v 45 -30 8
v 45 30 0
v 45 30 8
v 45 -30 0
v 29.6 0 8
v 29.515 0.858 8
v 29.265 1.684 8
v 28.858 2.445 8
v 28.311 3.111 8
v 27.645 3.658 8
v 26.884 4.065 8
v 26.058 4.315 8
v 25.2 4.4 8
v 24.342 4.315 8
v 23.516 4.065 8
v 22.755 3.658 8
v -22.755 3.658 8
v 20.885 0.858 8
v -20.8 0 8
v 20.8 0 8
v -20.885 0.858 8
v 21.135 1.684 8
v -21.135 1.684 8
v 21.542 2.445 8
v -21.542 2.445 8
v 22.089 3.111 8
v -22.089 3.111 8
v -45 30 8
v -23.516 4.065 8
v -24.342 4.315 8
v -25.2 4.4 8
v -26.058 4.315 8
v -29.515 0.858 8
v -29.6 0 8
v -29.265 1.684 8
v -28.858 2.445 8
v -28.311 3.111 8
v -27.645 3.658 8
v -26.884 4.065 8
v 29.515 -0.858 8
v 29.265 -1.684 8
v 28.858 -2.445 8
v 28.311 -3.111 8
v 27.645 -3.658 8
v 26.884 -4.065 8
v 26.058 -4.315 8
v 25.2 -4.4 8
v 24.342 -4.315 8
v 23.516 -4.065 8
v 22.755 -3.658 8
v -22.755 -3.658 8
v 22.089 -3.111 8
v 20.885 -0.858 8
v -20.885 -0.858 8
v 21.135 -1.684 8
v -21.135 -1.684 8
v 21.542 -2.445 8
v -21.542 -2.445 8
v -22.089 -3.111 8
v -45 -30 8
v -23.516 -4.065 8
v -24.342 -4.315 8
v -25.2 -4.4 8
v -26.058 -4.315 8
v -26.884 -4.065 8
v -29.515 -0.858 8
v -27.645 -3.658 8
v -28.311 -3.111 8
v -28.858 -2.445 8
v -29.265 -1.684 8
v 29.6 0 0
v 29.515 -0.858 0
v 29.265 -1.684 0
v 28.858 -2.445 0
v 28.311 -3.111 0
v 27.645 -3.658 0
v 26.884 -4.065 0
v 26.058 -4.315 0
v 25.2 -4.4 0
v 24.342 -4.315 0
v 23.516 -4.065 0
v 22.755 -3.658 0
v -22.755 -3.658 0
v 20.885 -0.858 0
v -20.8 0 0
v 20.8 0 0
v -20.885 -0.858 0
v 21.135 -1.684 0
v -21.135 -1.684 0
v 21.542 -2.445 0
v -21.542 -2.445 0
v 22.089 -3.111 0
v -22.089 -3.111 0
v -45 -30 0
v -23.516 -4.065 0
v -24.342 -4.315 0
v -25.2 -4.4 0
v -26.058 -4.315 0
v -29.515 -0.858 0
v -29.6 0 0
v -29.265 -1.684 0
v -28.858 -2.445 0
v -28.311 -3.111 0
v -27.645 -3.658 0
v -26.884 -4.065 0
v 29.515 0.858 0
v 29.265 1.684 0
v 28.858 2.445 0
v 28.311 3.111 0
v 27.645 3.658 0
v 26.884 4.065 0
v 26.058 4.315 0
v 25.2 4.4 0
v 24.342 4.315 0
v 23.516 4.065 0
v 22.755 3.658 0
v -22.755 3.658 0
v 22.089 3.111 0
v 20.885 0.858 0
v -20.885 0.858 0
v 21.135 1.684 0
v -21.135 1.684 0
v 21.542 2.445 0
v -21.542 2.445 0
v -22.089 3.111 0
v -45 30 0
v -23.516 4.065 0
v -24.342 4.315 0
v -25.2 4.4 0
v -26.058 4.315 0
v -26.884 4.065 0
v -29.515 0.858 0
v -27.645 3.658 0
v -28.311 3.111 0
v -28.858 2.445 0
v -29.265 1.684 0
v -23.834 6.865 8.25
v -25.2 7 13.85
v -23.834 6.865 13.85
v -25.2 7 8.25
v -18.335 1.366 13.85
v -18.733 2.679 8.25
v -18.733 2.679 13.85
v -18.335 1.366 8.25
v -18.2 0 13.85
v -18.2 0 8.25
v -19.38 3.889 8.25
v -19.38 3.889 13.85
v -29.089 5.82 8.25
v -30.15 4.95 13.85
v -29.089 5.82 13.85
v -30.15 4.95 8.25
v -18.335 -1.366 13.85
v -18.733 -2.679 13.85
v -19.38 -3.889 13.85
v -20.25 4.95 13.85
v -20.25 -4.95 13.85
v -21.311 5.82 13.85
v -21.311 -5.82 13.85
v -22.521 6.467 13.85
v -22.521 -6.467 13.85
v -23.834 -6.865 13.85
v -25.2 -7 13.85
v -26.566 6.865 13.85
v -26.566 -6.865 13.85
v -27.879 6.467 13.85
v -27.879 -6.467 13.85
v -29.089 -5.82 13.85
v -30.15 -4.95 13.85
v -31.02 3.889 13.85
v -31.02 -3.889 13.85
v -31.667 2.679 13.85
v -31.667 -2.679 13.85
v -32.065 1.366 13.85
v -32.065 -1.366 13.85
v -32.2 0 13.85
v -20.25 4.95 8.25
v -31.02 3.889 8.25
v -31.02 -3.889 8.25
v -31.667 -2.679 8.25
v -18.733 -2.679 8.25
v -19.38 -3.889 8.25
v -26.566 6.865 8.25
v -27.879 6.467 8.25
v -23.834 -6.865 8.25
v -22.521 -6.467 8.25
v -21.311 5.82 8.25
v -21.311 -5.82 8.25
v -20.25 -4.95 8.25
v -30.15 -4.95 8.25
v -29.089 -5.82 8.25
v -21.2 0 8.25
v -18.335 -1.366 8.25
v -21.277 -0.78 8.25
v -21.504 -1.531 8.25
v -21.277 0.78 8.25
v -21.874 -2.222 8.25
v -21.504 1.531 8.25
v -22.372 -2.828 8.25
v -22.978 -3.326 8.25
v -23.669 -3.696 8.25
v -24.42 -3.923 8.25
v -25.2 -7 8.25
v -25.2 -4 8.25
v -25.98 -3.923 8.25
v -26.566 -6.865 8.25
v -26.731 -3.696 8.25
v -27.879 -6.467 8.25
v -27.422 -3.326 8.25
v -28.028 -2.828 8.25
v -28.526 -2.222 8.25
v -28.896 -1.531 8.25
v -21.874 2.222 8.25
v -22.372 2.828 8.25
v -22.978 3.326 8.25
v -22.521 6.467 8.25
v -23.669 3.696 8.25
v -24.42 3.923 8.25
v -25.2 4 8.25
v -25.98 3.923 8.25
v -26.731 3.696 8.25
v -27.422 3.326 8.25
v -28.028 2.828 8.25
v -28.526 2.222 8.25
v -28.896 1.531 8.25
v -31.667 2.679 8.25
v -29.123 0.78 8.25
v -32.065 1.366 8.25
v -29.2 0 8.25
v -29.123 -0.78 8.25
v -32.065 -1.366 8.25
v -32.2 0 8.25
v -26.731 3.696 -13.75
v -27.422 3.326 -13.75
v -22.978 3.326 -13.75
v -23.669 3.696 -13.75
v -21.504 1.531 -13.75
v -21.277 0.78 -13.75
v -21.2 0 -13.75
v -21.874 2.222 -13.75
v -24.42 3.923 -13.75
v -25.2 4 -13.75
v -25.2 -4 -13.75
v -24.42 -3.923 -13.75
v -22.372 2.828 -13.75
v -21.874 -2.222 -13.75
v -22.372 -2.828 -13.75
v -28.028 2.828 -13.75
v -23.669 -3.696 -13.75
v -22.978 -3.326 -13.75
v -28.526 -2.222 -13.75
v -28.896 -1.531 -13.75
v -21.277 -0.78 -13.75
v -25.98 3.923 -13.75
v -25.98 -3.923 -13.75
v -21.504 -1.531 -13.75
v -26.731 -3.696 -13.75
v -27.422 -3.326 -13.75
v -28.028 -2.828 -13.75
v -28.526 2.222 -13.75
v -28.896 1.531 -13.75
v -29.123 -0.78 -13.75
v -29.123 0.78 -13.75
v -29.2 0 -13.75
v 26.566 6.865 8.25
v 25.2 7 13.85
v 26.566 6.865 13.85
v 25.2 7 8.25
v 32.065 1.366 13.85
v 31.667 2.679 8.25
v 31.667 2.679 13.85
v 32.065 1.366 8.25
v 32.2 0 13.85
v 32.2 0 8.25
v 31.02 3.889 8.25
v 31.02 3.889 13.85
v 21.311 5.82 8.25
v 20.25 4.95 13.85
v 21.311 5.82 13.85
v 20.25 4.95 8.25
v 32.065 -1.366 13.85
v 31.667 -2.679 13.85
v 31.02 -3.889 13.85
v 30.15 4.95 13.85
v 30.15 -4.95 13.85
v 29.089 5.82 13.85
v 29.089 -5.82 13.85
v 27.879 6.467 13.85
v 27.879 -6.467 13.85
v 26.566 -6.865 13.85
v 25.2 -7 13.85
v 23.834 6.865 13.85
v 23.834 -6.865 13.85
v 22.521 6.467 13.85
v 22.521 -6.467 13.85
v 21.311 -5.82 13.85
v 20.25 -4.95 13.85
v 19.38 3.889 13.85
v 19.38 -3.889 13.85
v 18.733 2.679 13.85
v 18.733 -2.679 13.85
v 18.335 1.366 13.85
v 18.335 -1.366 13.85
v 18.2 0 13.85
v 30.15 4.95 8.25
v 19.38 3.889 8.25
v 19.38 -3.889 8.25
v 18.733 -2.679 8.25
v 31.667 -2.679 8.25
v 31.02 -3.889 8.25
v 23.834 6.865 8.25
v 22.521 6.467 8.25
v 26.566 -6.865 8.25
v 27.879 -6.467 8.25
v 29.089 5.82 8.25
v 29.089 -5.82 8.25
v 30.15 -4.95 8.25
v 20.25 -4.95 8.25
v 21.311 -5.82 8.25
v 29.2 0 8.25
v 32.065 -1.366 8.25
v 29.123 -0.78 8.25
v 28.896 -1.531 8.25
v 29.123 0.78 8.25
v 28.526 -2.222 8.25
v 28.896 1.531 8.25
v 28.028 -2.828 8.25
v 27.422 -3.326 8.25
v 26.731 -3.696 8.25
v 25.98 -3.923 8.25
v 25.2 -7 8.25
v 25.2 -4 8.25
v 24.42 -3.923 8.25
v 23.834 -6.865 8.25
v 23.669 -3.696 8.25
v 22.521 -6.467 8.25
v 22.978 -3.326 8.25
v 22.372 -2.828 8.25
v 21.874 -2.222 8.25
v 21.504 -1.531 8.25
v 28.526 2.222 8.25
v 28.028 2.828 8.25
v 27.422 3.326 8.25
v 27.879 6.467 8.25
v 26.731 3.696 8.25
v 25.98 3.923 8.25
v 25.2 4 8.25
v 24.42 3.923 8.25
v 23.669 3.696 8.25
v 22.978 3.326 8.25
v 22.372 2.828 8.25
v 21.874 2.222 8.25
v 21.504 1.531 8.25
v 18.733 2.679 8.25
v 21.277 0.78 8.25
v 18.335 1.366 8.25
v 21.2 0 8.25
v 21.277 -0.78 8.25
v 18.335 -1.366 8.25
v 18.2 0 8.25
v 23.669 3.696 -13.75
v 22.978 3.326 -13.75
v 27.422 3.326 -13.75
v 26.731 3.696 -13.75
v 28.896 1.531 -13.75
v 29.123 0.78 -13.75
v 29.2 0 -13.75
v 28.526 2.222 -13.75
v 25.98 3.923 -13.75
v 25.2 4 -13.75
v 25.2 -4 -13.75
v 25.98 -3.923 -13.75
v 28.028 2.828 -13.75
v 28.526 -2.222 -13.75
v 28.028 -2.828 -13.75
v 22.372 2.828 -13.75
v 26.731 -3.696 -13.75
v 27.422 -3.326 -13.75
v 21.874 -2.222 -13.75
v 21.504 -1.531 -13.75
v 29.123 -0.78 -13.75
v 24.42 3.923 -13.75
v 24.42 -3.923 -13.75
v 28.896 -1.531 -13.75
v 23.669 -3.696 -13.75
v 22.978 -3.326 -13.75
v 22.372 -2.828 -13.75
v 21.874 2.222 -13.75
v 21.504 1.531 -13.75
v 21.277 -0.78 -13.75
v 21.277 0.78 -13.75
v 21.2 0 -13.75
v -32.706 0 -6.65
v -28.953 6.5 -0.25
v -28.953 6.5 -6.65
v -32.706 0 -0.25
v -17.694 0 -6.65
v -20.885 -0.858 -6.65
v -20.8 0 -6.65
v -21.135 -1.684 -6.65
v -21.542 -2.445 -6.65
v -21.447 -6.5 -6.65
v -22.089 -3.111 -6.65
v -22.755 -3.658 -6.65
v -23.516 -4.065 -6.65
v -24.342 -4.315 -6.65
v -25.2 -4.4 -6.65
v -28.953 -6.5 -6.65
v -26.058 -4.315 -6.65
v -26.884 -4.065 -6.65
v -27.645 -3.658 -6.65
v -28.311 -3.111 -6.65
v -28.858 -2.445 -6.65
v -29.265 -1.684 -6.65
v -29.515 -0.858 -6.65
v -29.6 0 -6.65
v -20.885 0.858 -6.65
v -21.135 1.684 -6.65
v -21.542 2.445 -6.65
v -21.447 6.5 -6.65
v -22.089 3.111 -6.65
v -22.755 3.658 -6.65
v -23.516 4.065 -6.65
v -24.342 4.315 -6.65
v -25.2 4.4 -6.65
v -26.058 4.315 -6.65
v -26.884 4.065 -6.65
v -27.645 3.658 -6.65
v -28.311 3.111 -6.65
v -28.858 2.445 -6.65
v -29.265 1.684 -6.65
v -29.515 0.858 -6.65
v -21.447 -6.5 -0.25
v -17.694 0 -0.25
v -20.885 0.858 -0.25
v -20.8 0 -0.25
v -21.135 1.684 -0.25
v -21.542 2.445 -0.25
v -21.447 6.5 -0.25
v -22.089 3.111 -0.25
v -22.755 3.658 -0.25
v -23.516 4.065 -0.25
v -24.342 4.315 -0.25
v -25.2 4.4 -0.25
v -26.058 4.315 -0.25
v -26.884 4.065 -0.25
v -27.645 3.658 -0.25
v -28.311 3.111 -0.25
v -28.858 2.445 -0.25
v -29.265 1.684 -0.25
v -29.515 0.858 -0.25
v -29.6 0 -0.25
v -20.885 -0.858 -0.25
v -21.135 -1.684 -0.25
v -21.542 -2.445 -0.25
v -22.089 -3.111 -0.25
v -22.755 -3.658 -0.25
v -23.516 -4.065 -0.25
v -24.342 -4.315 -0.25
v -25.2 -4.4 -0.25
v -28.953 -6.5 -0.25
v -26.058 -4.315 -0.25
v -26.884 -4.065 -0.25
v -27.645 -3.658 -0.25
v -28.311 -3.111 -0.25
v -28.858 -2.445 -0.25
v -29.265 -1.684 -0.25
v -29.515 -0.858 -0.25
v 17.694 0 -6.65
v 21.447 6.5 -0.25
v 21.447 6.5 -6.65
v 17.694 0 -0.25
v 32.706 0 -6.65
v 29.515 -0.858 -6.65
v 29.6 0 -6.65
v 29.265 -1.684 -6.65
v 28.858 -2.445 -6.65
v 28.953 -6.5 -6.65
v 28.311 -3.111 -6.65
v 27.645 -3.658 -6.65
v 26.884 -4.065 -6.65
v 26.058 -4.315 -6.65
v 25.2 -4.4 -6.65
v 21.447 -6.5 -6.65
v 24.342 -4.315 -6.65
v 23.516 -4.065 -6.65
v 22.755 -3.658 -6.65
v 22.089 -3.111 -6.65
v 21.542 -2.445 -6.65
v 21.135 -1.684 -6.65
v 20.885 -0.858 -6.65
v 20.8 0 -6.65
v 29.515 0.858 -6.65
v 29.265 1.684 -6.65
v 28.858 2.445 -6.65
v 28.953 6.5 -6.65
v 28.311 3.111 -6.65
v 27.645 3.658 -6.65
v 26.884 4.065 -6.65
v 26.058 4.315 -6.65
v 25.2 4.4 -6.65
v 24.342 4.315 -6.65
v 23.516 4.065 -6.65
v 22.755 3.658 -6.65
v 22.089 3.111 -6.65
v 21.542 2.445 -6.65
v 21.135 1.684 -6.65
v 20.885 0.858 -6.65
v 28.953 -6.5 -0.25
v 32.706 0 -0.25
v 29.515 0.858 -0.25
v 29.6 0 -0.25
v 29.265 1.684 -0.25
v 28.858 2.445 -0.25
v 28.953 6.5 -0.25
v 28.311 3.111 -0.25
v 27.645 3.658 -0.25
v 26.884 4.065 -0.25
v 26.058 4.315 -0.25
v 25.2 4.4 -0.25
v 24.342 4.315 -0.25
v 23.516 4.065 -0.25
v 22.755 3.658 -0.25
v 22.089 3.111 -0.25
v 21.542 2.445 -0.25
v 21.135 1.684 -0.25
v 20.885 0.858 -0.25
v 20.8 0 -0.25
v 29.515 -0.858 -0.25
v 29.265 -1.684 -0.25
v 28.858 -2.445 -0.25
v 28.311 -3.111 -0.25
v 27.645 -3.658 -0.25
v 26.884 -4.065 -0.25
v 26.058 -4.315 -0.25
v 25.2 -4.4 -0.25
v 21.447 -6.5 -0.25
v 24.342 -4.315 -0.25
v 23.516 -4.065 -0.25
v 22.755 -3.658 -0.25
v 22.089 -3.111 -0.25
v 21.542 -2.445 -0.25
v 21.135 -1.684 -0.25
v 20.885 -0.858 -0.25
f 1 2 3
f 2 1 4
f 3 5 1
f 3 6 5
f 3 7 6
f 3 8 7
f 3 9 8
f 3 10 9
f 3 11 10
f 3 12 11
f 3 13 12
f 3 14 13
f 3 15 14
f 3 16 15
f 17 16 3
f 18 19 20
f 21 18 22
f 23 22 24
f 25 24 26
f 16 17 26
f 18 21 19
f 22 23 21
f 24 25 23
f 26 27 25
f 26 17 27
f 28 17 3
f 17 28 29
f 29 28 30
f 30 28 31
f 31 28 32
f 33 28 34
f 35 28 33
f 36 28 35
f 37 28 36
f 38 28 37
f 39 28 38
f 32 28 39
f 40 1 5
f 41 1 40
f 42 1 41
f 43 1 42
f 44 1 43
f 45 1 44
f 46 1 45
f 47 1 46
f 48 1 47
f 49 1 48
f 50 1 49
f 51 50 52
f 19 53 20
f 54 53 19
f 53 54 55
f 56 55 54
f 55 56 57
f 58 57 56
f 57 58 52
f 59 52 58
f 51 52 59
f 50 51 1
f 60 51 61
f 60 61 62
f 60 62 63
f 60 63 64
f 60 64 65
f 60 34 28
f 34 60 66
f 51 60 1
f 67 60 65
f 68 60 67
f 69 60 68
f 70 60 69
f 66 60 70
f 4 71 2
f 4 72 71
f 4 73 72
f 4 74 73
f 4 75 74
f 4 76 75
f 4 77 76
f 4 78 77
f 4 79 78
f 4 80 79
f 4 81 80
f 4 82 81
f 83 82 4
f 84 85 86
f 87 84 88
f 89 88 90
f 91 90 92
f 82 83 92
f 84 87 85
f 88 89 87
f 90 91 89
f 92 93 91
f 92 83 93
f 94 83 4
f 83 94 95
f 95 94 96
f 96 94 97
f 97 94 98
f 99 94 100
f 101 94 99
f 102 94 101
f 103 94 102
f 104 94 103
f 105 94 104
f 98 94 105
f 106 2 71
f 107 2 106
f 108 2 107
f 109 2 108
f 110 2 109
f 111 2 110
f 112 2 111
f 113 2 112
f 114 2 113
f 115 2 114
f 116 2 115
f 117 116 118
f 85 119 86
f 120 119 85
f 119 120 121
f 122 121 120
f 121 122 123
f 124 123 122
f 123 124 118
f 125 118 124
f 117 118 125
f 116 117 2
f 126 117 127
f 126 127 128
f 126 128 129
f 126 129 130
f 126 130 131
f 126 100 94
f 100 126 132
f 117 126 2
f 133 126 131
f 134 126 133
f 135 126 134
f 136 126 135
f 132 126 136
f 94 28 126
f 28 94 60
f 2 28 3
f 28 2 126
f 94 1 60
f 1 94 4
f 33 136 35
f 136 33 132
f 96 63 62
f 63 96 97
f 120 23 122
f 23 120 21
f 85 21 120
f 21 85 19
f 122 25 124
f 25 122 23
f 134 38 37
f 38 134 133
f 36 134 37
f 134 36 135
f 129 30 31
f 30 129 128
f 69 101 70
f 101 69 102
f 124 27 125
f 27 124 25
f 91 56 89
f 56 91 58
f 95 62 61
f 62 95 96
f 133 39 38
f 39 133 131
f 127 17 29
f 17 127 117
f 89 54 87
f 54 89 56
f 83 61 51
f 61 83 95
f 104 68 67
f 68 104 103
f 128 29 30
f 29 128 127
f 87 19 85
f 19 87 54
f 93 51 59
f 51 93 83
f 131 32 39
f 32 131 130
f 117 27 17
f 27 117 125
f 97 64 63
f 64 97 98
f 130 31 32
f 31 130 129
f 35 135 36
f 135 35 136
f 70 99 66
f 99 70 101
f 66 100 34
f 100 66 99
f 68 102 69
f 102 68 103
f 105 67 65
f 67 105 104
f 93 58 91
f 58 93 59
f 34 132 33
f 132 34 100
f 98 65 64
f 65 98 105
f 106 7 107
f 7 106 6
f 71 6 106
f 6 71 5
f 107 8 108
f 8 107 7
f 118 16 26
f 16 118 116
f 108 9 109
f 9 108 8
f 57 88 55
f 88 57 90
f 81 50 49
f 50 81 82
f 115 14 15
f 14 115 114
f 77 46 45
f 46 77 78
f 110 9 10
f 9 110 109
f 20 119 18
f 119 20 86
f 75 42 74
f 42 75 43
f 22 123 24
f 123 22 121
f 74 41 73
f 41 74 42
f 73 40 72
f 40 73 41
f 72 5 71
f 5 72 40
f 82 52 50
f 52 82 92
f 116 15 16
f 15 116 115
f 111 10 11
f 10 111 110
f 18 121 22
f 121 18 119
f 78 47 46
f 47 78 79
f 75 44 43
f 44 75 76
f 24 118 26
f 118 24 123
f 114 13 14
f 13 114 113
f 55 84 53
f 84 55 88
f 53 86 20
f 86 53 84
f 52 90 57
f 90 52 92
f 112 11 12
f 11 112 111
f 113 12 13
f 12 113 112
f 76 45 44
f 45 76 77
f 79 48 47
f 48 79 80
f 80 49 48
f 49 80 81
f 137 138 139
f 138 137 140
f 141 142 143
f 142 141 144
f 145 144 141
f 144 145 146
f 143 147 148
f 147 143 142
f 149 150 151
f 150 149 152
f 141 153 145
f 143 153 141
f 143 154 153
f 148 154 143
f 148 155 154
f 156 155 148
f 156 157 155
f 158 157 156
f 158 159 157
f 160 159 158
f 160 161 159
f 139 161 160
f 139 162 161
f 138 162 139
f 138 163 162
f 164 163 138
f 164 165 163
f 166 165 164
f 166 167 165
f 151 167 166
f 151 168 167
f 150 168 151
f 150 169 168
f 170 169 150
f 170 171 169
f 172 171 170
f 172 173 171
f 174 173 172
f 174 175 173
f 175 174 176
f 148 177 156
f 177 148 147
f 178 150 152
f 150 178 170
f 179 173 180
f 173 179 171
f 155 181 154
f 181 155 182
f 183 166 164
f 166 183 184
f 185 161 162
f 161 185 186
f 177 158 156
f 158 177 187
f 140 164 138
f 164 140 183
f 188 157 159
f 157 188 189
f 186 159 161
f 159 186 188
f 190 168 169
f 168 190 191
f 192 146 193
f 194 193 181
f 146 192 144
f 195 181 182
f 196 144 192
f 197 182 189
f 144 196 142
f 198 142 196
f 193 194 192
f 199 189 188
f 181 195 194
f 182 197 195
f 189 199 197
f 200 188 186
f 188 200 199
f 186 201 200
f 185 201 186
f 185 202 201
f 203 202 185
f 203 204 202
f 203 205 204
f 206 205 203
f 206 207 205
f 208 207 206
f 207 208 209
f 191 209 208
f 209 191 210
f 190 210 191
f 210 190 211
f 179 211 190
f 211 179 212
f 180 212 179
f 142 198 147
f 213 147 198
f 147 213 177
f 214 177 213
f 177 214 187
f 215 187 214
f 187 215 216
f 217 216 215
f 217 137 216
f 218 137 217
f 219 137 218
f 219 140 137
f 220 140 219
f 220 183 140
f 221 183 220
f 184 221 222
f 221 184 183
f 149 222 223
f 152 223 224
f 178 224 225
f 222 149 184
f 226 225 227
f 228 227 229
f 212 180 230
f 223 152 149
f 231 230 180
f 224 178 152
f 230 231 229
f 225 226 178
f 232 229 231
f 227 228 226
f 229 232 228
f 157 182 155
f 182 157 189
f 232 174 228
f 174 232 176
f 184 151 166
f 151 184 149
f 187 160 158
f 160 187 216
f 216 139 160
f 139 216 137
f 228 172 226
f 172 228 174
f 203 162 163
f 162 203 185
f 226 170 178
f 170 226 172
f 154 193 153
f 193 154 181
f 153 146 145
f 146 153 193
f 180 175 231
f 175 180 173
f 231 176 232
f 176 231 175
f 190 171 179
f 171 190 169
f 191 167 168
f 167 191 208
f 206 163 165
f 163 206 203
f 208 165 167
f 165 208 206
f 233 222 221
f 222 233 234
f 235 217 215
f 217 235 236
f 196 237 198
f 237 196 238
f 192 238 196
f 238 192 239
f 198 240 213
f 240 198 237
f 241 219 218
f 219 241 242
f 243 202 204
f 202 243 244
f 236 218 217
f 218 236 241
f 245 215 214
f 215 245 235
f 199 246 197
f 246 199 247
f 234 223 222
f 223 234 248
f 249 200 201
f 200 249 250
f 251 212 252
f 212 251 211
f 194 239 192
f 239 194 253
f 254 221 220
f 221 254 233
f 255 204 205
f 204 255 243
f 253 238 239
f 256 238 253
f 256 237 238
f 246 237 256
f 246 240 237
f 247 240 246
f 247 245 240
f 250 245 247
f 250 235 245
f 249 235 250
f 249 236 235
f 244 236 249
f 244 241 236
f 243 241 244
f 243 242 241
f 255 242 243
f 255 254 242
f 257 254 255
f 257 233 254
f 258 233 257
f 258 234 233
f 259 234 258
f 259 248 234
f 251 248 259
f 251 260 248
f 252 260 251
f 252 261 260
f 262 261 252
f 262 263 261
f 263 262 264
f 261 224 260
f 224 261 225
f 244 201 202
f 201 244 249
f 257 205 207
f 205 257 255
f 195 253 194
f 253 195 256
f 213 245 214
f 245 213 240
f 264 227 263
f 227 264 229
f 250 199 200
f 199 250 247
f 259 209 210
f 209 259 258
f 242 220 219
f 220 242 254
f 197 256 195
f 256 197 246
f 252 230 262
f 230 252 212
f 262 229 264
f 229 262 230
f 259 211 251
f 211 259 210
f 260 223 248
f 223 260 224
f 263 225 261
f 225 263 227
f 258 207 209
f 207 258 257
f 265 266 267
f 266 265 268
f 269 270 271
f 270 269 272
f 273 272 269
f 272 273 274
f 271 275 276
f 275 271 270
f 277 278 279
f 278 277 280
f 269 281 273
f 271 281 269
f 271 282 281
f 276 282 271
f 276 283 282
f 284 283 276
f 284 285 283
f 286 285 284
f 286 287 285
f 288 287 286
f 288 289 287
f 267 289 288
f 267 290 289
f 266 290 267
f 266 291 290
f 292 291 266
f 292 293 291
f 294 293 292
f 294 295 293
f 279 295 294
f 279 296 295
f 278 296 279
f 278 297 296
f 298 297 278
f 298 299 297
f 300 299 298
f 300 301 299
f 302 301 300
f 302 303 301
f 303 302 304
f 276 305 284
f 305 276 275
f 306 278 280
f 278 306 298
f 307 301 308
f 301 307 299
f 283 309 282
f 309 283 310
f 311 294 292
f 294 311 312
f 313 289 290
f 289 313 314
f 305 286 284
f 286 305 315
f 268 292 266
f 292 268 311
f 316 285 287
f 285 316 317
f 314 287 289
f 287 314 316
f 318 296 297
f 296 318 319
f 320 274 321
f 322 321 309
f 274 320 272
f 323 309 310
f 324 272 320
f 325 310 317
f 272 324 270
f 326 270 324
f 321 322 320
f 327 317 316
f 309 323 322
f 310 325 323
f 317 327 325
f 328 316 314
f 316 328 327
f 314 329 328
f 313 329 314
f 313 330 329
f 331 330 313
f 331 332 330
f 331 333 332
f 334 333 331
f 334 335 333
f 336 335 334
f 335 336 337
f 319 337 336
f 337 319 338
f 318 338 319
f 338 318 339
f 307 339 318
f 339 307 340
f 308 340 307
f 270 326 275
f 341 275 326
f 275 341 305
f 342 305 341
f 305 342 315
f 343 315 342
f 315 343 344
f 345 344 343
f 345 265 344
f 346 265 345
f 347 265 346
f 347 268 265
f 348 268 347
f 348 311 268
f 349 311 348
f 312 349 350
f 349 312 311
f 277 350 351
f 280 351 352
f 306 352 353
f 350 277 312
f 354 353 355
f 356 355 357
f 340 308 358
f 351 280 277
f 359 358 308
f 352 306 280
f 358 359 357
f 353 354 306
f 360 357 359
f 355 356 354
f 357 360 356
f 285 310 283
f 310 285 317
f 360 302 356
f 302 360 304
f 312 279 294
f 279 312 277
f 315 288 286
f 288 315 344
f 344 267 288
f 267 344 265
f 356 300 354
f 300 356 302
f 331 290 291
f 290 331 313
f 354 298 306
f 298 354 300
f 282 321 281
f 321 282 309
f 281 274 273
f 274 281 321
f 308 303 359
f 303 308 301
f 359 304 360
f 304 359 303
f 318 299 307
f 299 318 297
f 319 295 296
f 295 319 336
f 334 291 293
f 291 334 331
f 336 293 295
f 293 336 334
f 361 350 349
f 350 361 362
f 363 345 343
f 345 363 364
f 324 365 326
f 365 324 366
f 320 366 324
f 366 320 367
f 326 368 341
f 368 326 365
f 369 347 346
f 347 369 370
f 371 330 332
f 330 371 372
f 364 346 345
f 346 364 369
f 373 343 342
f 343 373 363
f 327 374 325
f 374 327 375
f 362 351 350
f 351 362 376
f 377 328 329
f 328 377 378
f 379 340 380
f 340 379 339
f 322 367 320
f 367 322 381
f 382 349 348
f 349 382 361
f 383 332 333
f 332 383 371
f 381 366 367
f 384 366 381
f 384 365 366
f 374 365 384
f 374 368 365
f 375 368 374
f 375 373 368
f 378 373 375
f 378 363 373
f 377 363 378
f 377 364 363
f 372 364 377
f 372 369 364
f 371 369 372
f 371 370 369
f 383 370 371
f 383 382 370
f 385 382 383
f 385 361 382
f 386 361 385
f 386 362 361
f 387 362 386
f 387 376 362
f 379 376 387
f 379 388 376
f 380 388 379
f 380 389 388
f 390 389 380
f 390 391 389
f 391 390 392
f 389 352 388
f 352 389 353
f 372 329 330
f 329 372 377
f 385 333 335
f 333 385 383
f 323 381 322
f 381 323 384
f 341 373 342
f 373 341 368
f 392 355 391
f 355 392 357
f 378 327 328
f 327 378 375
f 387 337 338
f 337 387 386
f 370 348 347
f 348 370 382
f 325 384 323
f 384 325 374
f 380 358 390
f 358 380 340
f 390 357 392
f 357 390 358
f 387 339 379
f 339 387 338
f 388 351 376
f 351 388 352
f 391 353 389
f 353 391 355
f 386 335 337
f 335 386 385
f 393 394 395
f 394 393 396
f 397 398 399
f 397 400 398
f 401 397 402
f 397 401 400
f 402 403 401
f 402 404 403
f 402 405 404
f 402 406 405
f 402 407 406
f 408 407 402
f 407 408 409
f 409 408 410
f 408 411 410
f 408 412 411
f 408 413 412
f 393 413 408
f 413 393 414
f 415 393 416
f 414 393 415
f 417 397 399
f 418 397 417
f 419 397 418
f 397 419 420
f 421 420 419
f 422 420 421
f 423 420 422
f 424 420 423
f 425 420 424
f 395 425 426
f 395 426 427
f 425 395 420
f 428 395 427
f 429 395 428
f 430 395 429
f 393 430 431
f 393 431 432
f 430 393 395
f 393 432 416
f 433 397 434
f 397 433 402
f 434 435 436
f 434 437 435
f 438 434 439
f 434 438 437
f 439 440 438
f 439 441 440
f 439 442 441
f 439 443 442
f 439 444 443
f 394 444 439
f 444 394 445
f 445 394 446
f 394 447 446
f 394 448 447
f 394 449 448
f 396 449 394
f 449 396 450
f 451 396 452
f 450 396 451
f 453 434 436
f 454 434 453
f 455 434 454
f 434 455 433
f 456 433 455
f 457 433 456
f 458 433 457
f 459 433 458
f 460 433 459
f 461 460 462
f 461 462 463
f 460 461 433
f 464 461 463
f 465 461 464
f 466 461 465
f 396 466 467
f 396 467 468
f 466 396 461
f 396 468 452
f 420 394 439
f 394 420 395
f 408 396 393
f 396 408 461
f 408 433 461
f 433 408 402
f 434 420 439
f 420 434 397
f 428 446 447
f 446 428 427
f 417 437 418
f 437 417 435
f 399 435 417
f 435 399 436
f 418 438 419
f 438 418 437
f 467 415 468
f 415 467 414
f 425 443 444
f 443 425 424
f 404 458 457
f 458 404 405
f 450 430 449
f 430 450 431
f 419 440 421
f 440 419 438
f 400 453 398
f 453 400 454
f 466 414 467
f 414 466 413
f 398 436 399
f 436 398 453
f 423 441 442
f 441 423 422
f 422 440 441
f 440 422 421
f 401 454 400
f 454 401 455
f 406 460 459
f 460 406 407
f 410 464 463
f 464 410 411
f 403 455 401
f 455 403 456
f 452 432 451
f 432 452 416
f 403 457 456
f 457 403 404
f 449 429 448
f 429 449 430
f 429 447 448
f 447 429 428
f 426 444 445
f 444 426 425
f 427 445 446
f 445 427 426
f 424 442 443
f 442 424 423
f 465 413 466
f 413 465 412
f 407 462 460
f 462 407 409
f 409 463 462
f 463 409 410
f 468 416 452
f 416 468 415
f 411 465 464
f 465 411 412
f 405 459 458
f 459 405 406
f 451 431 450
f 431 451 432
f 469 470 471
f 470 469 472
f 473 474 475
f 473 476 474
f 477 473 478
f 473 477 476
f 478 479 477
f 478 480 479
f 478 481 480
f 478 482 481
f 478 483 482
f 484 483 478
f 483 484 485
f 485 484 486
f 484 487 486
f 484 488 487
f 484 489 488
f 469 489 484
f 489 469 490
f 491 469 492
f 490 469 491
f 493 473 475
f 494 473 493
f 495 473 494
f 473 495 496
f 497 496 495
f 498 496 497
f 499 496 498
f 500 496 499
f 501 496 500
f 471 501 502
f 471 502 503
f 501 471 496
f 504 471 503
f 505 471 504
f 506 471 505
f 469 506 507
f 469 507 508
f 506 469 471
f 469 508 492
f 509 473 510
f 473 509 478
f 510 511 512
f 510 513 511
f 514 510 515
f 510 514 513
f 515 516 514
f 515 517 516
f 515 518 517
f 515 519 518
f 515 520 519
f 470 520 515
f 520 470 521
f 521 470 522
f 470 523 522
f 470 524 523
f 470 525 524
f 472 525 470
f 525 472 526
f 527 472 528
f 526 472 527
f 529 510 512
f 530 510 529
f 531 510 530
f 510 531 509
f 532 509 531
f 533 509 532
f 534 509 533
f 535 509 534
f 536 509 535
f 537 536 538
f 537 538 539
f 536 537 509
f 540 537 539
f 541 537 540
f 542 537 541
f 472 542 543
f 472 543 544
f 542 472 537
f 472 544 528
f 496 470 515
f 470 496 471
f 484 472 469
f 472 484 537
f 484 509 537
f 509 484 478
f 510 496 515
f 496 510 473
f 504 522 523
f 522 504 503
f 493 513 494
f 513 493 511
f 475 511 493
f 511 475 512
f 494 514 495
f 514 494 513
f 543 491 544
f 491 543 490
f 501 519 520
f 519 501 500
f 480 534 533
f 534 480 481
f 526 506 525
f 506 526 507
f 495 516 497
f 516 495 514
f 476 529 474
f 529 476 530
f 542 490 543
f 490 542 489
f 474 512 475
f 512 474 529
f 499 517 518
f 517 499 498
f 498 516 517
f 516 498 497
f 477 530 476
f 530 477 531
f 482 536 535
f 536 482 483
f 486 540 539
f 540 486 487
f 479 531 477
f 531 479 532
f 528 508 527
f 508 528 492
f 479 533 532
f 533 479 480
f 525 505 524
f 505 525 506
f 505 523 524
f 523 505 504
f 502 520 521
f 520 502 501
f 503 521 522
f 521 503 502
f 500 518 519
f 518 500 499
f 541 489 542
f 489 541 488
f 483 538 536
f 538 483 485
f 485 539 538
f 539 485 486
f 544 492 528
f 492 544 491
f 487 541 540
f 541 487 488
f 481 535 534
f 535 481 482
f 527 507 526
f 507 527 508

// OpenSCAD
$fn = 32;

// ------------------------------------------------------------------------
// Bolted plate: 90 x 60 x 8 mm plate, 2 fasteners
// Every part is its own module, assembly() places them once.
// ------------------------------------------------------------------------

// --- part 1 ---
module plate() {
  difference() {
    translate([-45, -30, 0]) cube([90, 60, 8]);
    translate([-25.2, 0, -1]) cylinder(h = 10, d = 8.8);
    translate([25.2, 0, -1]) cylinder(h = 10, d = 8.8);
  }
}

// --- part 2 ---
module bolt1() {
  cylinder(h = 5.6, d = 14);
  translate([0, 0, -22]) cylinder(h = 22, d = 8);
}

// --- part 3 ---
module bolt2() {
  cylinder(h = 5.6, d = 14);
  translate([0, 0, -22]) cylinder(h = 22, d = 8);
}

// --- part 4 ---
module nut1() {
  difference() {
    linear_extrude(height = 6.4) polygon(points = [[7.506, 0], [3.753, 6.5], [-3.753, 6.5], [-7.506, 0], [-3.753, -6.5], [3.753, -6.5]]);
    translate([0, 0, -1]) cylinder(h = 8.4, d = 8.8);
  }
}

// --- part 5 ---
module nut2() {
  difference() {
    linear_extrude(height = 6.4) polygon(points = [[7.506, 0], [3.753, 6.5], [-3.753, 6.5], [-7.506, 0], [-3.753, -6.5], [3.753, -6.5]]);
    translate([0, 0, -1]) cylinder(h = 8.4, d = 8.8);
  }
}

// --- assembly ---
module assembly() {
  translate([0, 0, 0]) rotate([0, 0, 0]) plate();
  translate([-25.2, 0, 8.25]) rotate([0, 0, 0]) bolt1();
  translate([25.2, 0, 8.25]) rotate([0, 0, 0]) bolt2();
  translate([-25.2, 0, -6.65]) rotate([0, 0, 0]) nut1();
  translate([25.2, 0, -6.65]) rotate([0, 0, 0]) nut2();
}

assembly();
